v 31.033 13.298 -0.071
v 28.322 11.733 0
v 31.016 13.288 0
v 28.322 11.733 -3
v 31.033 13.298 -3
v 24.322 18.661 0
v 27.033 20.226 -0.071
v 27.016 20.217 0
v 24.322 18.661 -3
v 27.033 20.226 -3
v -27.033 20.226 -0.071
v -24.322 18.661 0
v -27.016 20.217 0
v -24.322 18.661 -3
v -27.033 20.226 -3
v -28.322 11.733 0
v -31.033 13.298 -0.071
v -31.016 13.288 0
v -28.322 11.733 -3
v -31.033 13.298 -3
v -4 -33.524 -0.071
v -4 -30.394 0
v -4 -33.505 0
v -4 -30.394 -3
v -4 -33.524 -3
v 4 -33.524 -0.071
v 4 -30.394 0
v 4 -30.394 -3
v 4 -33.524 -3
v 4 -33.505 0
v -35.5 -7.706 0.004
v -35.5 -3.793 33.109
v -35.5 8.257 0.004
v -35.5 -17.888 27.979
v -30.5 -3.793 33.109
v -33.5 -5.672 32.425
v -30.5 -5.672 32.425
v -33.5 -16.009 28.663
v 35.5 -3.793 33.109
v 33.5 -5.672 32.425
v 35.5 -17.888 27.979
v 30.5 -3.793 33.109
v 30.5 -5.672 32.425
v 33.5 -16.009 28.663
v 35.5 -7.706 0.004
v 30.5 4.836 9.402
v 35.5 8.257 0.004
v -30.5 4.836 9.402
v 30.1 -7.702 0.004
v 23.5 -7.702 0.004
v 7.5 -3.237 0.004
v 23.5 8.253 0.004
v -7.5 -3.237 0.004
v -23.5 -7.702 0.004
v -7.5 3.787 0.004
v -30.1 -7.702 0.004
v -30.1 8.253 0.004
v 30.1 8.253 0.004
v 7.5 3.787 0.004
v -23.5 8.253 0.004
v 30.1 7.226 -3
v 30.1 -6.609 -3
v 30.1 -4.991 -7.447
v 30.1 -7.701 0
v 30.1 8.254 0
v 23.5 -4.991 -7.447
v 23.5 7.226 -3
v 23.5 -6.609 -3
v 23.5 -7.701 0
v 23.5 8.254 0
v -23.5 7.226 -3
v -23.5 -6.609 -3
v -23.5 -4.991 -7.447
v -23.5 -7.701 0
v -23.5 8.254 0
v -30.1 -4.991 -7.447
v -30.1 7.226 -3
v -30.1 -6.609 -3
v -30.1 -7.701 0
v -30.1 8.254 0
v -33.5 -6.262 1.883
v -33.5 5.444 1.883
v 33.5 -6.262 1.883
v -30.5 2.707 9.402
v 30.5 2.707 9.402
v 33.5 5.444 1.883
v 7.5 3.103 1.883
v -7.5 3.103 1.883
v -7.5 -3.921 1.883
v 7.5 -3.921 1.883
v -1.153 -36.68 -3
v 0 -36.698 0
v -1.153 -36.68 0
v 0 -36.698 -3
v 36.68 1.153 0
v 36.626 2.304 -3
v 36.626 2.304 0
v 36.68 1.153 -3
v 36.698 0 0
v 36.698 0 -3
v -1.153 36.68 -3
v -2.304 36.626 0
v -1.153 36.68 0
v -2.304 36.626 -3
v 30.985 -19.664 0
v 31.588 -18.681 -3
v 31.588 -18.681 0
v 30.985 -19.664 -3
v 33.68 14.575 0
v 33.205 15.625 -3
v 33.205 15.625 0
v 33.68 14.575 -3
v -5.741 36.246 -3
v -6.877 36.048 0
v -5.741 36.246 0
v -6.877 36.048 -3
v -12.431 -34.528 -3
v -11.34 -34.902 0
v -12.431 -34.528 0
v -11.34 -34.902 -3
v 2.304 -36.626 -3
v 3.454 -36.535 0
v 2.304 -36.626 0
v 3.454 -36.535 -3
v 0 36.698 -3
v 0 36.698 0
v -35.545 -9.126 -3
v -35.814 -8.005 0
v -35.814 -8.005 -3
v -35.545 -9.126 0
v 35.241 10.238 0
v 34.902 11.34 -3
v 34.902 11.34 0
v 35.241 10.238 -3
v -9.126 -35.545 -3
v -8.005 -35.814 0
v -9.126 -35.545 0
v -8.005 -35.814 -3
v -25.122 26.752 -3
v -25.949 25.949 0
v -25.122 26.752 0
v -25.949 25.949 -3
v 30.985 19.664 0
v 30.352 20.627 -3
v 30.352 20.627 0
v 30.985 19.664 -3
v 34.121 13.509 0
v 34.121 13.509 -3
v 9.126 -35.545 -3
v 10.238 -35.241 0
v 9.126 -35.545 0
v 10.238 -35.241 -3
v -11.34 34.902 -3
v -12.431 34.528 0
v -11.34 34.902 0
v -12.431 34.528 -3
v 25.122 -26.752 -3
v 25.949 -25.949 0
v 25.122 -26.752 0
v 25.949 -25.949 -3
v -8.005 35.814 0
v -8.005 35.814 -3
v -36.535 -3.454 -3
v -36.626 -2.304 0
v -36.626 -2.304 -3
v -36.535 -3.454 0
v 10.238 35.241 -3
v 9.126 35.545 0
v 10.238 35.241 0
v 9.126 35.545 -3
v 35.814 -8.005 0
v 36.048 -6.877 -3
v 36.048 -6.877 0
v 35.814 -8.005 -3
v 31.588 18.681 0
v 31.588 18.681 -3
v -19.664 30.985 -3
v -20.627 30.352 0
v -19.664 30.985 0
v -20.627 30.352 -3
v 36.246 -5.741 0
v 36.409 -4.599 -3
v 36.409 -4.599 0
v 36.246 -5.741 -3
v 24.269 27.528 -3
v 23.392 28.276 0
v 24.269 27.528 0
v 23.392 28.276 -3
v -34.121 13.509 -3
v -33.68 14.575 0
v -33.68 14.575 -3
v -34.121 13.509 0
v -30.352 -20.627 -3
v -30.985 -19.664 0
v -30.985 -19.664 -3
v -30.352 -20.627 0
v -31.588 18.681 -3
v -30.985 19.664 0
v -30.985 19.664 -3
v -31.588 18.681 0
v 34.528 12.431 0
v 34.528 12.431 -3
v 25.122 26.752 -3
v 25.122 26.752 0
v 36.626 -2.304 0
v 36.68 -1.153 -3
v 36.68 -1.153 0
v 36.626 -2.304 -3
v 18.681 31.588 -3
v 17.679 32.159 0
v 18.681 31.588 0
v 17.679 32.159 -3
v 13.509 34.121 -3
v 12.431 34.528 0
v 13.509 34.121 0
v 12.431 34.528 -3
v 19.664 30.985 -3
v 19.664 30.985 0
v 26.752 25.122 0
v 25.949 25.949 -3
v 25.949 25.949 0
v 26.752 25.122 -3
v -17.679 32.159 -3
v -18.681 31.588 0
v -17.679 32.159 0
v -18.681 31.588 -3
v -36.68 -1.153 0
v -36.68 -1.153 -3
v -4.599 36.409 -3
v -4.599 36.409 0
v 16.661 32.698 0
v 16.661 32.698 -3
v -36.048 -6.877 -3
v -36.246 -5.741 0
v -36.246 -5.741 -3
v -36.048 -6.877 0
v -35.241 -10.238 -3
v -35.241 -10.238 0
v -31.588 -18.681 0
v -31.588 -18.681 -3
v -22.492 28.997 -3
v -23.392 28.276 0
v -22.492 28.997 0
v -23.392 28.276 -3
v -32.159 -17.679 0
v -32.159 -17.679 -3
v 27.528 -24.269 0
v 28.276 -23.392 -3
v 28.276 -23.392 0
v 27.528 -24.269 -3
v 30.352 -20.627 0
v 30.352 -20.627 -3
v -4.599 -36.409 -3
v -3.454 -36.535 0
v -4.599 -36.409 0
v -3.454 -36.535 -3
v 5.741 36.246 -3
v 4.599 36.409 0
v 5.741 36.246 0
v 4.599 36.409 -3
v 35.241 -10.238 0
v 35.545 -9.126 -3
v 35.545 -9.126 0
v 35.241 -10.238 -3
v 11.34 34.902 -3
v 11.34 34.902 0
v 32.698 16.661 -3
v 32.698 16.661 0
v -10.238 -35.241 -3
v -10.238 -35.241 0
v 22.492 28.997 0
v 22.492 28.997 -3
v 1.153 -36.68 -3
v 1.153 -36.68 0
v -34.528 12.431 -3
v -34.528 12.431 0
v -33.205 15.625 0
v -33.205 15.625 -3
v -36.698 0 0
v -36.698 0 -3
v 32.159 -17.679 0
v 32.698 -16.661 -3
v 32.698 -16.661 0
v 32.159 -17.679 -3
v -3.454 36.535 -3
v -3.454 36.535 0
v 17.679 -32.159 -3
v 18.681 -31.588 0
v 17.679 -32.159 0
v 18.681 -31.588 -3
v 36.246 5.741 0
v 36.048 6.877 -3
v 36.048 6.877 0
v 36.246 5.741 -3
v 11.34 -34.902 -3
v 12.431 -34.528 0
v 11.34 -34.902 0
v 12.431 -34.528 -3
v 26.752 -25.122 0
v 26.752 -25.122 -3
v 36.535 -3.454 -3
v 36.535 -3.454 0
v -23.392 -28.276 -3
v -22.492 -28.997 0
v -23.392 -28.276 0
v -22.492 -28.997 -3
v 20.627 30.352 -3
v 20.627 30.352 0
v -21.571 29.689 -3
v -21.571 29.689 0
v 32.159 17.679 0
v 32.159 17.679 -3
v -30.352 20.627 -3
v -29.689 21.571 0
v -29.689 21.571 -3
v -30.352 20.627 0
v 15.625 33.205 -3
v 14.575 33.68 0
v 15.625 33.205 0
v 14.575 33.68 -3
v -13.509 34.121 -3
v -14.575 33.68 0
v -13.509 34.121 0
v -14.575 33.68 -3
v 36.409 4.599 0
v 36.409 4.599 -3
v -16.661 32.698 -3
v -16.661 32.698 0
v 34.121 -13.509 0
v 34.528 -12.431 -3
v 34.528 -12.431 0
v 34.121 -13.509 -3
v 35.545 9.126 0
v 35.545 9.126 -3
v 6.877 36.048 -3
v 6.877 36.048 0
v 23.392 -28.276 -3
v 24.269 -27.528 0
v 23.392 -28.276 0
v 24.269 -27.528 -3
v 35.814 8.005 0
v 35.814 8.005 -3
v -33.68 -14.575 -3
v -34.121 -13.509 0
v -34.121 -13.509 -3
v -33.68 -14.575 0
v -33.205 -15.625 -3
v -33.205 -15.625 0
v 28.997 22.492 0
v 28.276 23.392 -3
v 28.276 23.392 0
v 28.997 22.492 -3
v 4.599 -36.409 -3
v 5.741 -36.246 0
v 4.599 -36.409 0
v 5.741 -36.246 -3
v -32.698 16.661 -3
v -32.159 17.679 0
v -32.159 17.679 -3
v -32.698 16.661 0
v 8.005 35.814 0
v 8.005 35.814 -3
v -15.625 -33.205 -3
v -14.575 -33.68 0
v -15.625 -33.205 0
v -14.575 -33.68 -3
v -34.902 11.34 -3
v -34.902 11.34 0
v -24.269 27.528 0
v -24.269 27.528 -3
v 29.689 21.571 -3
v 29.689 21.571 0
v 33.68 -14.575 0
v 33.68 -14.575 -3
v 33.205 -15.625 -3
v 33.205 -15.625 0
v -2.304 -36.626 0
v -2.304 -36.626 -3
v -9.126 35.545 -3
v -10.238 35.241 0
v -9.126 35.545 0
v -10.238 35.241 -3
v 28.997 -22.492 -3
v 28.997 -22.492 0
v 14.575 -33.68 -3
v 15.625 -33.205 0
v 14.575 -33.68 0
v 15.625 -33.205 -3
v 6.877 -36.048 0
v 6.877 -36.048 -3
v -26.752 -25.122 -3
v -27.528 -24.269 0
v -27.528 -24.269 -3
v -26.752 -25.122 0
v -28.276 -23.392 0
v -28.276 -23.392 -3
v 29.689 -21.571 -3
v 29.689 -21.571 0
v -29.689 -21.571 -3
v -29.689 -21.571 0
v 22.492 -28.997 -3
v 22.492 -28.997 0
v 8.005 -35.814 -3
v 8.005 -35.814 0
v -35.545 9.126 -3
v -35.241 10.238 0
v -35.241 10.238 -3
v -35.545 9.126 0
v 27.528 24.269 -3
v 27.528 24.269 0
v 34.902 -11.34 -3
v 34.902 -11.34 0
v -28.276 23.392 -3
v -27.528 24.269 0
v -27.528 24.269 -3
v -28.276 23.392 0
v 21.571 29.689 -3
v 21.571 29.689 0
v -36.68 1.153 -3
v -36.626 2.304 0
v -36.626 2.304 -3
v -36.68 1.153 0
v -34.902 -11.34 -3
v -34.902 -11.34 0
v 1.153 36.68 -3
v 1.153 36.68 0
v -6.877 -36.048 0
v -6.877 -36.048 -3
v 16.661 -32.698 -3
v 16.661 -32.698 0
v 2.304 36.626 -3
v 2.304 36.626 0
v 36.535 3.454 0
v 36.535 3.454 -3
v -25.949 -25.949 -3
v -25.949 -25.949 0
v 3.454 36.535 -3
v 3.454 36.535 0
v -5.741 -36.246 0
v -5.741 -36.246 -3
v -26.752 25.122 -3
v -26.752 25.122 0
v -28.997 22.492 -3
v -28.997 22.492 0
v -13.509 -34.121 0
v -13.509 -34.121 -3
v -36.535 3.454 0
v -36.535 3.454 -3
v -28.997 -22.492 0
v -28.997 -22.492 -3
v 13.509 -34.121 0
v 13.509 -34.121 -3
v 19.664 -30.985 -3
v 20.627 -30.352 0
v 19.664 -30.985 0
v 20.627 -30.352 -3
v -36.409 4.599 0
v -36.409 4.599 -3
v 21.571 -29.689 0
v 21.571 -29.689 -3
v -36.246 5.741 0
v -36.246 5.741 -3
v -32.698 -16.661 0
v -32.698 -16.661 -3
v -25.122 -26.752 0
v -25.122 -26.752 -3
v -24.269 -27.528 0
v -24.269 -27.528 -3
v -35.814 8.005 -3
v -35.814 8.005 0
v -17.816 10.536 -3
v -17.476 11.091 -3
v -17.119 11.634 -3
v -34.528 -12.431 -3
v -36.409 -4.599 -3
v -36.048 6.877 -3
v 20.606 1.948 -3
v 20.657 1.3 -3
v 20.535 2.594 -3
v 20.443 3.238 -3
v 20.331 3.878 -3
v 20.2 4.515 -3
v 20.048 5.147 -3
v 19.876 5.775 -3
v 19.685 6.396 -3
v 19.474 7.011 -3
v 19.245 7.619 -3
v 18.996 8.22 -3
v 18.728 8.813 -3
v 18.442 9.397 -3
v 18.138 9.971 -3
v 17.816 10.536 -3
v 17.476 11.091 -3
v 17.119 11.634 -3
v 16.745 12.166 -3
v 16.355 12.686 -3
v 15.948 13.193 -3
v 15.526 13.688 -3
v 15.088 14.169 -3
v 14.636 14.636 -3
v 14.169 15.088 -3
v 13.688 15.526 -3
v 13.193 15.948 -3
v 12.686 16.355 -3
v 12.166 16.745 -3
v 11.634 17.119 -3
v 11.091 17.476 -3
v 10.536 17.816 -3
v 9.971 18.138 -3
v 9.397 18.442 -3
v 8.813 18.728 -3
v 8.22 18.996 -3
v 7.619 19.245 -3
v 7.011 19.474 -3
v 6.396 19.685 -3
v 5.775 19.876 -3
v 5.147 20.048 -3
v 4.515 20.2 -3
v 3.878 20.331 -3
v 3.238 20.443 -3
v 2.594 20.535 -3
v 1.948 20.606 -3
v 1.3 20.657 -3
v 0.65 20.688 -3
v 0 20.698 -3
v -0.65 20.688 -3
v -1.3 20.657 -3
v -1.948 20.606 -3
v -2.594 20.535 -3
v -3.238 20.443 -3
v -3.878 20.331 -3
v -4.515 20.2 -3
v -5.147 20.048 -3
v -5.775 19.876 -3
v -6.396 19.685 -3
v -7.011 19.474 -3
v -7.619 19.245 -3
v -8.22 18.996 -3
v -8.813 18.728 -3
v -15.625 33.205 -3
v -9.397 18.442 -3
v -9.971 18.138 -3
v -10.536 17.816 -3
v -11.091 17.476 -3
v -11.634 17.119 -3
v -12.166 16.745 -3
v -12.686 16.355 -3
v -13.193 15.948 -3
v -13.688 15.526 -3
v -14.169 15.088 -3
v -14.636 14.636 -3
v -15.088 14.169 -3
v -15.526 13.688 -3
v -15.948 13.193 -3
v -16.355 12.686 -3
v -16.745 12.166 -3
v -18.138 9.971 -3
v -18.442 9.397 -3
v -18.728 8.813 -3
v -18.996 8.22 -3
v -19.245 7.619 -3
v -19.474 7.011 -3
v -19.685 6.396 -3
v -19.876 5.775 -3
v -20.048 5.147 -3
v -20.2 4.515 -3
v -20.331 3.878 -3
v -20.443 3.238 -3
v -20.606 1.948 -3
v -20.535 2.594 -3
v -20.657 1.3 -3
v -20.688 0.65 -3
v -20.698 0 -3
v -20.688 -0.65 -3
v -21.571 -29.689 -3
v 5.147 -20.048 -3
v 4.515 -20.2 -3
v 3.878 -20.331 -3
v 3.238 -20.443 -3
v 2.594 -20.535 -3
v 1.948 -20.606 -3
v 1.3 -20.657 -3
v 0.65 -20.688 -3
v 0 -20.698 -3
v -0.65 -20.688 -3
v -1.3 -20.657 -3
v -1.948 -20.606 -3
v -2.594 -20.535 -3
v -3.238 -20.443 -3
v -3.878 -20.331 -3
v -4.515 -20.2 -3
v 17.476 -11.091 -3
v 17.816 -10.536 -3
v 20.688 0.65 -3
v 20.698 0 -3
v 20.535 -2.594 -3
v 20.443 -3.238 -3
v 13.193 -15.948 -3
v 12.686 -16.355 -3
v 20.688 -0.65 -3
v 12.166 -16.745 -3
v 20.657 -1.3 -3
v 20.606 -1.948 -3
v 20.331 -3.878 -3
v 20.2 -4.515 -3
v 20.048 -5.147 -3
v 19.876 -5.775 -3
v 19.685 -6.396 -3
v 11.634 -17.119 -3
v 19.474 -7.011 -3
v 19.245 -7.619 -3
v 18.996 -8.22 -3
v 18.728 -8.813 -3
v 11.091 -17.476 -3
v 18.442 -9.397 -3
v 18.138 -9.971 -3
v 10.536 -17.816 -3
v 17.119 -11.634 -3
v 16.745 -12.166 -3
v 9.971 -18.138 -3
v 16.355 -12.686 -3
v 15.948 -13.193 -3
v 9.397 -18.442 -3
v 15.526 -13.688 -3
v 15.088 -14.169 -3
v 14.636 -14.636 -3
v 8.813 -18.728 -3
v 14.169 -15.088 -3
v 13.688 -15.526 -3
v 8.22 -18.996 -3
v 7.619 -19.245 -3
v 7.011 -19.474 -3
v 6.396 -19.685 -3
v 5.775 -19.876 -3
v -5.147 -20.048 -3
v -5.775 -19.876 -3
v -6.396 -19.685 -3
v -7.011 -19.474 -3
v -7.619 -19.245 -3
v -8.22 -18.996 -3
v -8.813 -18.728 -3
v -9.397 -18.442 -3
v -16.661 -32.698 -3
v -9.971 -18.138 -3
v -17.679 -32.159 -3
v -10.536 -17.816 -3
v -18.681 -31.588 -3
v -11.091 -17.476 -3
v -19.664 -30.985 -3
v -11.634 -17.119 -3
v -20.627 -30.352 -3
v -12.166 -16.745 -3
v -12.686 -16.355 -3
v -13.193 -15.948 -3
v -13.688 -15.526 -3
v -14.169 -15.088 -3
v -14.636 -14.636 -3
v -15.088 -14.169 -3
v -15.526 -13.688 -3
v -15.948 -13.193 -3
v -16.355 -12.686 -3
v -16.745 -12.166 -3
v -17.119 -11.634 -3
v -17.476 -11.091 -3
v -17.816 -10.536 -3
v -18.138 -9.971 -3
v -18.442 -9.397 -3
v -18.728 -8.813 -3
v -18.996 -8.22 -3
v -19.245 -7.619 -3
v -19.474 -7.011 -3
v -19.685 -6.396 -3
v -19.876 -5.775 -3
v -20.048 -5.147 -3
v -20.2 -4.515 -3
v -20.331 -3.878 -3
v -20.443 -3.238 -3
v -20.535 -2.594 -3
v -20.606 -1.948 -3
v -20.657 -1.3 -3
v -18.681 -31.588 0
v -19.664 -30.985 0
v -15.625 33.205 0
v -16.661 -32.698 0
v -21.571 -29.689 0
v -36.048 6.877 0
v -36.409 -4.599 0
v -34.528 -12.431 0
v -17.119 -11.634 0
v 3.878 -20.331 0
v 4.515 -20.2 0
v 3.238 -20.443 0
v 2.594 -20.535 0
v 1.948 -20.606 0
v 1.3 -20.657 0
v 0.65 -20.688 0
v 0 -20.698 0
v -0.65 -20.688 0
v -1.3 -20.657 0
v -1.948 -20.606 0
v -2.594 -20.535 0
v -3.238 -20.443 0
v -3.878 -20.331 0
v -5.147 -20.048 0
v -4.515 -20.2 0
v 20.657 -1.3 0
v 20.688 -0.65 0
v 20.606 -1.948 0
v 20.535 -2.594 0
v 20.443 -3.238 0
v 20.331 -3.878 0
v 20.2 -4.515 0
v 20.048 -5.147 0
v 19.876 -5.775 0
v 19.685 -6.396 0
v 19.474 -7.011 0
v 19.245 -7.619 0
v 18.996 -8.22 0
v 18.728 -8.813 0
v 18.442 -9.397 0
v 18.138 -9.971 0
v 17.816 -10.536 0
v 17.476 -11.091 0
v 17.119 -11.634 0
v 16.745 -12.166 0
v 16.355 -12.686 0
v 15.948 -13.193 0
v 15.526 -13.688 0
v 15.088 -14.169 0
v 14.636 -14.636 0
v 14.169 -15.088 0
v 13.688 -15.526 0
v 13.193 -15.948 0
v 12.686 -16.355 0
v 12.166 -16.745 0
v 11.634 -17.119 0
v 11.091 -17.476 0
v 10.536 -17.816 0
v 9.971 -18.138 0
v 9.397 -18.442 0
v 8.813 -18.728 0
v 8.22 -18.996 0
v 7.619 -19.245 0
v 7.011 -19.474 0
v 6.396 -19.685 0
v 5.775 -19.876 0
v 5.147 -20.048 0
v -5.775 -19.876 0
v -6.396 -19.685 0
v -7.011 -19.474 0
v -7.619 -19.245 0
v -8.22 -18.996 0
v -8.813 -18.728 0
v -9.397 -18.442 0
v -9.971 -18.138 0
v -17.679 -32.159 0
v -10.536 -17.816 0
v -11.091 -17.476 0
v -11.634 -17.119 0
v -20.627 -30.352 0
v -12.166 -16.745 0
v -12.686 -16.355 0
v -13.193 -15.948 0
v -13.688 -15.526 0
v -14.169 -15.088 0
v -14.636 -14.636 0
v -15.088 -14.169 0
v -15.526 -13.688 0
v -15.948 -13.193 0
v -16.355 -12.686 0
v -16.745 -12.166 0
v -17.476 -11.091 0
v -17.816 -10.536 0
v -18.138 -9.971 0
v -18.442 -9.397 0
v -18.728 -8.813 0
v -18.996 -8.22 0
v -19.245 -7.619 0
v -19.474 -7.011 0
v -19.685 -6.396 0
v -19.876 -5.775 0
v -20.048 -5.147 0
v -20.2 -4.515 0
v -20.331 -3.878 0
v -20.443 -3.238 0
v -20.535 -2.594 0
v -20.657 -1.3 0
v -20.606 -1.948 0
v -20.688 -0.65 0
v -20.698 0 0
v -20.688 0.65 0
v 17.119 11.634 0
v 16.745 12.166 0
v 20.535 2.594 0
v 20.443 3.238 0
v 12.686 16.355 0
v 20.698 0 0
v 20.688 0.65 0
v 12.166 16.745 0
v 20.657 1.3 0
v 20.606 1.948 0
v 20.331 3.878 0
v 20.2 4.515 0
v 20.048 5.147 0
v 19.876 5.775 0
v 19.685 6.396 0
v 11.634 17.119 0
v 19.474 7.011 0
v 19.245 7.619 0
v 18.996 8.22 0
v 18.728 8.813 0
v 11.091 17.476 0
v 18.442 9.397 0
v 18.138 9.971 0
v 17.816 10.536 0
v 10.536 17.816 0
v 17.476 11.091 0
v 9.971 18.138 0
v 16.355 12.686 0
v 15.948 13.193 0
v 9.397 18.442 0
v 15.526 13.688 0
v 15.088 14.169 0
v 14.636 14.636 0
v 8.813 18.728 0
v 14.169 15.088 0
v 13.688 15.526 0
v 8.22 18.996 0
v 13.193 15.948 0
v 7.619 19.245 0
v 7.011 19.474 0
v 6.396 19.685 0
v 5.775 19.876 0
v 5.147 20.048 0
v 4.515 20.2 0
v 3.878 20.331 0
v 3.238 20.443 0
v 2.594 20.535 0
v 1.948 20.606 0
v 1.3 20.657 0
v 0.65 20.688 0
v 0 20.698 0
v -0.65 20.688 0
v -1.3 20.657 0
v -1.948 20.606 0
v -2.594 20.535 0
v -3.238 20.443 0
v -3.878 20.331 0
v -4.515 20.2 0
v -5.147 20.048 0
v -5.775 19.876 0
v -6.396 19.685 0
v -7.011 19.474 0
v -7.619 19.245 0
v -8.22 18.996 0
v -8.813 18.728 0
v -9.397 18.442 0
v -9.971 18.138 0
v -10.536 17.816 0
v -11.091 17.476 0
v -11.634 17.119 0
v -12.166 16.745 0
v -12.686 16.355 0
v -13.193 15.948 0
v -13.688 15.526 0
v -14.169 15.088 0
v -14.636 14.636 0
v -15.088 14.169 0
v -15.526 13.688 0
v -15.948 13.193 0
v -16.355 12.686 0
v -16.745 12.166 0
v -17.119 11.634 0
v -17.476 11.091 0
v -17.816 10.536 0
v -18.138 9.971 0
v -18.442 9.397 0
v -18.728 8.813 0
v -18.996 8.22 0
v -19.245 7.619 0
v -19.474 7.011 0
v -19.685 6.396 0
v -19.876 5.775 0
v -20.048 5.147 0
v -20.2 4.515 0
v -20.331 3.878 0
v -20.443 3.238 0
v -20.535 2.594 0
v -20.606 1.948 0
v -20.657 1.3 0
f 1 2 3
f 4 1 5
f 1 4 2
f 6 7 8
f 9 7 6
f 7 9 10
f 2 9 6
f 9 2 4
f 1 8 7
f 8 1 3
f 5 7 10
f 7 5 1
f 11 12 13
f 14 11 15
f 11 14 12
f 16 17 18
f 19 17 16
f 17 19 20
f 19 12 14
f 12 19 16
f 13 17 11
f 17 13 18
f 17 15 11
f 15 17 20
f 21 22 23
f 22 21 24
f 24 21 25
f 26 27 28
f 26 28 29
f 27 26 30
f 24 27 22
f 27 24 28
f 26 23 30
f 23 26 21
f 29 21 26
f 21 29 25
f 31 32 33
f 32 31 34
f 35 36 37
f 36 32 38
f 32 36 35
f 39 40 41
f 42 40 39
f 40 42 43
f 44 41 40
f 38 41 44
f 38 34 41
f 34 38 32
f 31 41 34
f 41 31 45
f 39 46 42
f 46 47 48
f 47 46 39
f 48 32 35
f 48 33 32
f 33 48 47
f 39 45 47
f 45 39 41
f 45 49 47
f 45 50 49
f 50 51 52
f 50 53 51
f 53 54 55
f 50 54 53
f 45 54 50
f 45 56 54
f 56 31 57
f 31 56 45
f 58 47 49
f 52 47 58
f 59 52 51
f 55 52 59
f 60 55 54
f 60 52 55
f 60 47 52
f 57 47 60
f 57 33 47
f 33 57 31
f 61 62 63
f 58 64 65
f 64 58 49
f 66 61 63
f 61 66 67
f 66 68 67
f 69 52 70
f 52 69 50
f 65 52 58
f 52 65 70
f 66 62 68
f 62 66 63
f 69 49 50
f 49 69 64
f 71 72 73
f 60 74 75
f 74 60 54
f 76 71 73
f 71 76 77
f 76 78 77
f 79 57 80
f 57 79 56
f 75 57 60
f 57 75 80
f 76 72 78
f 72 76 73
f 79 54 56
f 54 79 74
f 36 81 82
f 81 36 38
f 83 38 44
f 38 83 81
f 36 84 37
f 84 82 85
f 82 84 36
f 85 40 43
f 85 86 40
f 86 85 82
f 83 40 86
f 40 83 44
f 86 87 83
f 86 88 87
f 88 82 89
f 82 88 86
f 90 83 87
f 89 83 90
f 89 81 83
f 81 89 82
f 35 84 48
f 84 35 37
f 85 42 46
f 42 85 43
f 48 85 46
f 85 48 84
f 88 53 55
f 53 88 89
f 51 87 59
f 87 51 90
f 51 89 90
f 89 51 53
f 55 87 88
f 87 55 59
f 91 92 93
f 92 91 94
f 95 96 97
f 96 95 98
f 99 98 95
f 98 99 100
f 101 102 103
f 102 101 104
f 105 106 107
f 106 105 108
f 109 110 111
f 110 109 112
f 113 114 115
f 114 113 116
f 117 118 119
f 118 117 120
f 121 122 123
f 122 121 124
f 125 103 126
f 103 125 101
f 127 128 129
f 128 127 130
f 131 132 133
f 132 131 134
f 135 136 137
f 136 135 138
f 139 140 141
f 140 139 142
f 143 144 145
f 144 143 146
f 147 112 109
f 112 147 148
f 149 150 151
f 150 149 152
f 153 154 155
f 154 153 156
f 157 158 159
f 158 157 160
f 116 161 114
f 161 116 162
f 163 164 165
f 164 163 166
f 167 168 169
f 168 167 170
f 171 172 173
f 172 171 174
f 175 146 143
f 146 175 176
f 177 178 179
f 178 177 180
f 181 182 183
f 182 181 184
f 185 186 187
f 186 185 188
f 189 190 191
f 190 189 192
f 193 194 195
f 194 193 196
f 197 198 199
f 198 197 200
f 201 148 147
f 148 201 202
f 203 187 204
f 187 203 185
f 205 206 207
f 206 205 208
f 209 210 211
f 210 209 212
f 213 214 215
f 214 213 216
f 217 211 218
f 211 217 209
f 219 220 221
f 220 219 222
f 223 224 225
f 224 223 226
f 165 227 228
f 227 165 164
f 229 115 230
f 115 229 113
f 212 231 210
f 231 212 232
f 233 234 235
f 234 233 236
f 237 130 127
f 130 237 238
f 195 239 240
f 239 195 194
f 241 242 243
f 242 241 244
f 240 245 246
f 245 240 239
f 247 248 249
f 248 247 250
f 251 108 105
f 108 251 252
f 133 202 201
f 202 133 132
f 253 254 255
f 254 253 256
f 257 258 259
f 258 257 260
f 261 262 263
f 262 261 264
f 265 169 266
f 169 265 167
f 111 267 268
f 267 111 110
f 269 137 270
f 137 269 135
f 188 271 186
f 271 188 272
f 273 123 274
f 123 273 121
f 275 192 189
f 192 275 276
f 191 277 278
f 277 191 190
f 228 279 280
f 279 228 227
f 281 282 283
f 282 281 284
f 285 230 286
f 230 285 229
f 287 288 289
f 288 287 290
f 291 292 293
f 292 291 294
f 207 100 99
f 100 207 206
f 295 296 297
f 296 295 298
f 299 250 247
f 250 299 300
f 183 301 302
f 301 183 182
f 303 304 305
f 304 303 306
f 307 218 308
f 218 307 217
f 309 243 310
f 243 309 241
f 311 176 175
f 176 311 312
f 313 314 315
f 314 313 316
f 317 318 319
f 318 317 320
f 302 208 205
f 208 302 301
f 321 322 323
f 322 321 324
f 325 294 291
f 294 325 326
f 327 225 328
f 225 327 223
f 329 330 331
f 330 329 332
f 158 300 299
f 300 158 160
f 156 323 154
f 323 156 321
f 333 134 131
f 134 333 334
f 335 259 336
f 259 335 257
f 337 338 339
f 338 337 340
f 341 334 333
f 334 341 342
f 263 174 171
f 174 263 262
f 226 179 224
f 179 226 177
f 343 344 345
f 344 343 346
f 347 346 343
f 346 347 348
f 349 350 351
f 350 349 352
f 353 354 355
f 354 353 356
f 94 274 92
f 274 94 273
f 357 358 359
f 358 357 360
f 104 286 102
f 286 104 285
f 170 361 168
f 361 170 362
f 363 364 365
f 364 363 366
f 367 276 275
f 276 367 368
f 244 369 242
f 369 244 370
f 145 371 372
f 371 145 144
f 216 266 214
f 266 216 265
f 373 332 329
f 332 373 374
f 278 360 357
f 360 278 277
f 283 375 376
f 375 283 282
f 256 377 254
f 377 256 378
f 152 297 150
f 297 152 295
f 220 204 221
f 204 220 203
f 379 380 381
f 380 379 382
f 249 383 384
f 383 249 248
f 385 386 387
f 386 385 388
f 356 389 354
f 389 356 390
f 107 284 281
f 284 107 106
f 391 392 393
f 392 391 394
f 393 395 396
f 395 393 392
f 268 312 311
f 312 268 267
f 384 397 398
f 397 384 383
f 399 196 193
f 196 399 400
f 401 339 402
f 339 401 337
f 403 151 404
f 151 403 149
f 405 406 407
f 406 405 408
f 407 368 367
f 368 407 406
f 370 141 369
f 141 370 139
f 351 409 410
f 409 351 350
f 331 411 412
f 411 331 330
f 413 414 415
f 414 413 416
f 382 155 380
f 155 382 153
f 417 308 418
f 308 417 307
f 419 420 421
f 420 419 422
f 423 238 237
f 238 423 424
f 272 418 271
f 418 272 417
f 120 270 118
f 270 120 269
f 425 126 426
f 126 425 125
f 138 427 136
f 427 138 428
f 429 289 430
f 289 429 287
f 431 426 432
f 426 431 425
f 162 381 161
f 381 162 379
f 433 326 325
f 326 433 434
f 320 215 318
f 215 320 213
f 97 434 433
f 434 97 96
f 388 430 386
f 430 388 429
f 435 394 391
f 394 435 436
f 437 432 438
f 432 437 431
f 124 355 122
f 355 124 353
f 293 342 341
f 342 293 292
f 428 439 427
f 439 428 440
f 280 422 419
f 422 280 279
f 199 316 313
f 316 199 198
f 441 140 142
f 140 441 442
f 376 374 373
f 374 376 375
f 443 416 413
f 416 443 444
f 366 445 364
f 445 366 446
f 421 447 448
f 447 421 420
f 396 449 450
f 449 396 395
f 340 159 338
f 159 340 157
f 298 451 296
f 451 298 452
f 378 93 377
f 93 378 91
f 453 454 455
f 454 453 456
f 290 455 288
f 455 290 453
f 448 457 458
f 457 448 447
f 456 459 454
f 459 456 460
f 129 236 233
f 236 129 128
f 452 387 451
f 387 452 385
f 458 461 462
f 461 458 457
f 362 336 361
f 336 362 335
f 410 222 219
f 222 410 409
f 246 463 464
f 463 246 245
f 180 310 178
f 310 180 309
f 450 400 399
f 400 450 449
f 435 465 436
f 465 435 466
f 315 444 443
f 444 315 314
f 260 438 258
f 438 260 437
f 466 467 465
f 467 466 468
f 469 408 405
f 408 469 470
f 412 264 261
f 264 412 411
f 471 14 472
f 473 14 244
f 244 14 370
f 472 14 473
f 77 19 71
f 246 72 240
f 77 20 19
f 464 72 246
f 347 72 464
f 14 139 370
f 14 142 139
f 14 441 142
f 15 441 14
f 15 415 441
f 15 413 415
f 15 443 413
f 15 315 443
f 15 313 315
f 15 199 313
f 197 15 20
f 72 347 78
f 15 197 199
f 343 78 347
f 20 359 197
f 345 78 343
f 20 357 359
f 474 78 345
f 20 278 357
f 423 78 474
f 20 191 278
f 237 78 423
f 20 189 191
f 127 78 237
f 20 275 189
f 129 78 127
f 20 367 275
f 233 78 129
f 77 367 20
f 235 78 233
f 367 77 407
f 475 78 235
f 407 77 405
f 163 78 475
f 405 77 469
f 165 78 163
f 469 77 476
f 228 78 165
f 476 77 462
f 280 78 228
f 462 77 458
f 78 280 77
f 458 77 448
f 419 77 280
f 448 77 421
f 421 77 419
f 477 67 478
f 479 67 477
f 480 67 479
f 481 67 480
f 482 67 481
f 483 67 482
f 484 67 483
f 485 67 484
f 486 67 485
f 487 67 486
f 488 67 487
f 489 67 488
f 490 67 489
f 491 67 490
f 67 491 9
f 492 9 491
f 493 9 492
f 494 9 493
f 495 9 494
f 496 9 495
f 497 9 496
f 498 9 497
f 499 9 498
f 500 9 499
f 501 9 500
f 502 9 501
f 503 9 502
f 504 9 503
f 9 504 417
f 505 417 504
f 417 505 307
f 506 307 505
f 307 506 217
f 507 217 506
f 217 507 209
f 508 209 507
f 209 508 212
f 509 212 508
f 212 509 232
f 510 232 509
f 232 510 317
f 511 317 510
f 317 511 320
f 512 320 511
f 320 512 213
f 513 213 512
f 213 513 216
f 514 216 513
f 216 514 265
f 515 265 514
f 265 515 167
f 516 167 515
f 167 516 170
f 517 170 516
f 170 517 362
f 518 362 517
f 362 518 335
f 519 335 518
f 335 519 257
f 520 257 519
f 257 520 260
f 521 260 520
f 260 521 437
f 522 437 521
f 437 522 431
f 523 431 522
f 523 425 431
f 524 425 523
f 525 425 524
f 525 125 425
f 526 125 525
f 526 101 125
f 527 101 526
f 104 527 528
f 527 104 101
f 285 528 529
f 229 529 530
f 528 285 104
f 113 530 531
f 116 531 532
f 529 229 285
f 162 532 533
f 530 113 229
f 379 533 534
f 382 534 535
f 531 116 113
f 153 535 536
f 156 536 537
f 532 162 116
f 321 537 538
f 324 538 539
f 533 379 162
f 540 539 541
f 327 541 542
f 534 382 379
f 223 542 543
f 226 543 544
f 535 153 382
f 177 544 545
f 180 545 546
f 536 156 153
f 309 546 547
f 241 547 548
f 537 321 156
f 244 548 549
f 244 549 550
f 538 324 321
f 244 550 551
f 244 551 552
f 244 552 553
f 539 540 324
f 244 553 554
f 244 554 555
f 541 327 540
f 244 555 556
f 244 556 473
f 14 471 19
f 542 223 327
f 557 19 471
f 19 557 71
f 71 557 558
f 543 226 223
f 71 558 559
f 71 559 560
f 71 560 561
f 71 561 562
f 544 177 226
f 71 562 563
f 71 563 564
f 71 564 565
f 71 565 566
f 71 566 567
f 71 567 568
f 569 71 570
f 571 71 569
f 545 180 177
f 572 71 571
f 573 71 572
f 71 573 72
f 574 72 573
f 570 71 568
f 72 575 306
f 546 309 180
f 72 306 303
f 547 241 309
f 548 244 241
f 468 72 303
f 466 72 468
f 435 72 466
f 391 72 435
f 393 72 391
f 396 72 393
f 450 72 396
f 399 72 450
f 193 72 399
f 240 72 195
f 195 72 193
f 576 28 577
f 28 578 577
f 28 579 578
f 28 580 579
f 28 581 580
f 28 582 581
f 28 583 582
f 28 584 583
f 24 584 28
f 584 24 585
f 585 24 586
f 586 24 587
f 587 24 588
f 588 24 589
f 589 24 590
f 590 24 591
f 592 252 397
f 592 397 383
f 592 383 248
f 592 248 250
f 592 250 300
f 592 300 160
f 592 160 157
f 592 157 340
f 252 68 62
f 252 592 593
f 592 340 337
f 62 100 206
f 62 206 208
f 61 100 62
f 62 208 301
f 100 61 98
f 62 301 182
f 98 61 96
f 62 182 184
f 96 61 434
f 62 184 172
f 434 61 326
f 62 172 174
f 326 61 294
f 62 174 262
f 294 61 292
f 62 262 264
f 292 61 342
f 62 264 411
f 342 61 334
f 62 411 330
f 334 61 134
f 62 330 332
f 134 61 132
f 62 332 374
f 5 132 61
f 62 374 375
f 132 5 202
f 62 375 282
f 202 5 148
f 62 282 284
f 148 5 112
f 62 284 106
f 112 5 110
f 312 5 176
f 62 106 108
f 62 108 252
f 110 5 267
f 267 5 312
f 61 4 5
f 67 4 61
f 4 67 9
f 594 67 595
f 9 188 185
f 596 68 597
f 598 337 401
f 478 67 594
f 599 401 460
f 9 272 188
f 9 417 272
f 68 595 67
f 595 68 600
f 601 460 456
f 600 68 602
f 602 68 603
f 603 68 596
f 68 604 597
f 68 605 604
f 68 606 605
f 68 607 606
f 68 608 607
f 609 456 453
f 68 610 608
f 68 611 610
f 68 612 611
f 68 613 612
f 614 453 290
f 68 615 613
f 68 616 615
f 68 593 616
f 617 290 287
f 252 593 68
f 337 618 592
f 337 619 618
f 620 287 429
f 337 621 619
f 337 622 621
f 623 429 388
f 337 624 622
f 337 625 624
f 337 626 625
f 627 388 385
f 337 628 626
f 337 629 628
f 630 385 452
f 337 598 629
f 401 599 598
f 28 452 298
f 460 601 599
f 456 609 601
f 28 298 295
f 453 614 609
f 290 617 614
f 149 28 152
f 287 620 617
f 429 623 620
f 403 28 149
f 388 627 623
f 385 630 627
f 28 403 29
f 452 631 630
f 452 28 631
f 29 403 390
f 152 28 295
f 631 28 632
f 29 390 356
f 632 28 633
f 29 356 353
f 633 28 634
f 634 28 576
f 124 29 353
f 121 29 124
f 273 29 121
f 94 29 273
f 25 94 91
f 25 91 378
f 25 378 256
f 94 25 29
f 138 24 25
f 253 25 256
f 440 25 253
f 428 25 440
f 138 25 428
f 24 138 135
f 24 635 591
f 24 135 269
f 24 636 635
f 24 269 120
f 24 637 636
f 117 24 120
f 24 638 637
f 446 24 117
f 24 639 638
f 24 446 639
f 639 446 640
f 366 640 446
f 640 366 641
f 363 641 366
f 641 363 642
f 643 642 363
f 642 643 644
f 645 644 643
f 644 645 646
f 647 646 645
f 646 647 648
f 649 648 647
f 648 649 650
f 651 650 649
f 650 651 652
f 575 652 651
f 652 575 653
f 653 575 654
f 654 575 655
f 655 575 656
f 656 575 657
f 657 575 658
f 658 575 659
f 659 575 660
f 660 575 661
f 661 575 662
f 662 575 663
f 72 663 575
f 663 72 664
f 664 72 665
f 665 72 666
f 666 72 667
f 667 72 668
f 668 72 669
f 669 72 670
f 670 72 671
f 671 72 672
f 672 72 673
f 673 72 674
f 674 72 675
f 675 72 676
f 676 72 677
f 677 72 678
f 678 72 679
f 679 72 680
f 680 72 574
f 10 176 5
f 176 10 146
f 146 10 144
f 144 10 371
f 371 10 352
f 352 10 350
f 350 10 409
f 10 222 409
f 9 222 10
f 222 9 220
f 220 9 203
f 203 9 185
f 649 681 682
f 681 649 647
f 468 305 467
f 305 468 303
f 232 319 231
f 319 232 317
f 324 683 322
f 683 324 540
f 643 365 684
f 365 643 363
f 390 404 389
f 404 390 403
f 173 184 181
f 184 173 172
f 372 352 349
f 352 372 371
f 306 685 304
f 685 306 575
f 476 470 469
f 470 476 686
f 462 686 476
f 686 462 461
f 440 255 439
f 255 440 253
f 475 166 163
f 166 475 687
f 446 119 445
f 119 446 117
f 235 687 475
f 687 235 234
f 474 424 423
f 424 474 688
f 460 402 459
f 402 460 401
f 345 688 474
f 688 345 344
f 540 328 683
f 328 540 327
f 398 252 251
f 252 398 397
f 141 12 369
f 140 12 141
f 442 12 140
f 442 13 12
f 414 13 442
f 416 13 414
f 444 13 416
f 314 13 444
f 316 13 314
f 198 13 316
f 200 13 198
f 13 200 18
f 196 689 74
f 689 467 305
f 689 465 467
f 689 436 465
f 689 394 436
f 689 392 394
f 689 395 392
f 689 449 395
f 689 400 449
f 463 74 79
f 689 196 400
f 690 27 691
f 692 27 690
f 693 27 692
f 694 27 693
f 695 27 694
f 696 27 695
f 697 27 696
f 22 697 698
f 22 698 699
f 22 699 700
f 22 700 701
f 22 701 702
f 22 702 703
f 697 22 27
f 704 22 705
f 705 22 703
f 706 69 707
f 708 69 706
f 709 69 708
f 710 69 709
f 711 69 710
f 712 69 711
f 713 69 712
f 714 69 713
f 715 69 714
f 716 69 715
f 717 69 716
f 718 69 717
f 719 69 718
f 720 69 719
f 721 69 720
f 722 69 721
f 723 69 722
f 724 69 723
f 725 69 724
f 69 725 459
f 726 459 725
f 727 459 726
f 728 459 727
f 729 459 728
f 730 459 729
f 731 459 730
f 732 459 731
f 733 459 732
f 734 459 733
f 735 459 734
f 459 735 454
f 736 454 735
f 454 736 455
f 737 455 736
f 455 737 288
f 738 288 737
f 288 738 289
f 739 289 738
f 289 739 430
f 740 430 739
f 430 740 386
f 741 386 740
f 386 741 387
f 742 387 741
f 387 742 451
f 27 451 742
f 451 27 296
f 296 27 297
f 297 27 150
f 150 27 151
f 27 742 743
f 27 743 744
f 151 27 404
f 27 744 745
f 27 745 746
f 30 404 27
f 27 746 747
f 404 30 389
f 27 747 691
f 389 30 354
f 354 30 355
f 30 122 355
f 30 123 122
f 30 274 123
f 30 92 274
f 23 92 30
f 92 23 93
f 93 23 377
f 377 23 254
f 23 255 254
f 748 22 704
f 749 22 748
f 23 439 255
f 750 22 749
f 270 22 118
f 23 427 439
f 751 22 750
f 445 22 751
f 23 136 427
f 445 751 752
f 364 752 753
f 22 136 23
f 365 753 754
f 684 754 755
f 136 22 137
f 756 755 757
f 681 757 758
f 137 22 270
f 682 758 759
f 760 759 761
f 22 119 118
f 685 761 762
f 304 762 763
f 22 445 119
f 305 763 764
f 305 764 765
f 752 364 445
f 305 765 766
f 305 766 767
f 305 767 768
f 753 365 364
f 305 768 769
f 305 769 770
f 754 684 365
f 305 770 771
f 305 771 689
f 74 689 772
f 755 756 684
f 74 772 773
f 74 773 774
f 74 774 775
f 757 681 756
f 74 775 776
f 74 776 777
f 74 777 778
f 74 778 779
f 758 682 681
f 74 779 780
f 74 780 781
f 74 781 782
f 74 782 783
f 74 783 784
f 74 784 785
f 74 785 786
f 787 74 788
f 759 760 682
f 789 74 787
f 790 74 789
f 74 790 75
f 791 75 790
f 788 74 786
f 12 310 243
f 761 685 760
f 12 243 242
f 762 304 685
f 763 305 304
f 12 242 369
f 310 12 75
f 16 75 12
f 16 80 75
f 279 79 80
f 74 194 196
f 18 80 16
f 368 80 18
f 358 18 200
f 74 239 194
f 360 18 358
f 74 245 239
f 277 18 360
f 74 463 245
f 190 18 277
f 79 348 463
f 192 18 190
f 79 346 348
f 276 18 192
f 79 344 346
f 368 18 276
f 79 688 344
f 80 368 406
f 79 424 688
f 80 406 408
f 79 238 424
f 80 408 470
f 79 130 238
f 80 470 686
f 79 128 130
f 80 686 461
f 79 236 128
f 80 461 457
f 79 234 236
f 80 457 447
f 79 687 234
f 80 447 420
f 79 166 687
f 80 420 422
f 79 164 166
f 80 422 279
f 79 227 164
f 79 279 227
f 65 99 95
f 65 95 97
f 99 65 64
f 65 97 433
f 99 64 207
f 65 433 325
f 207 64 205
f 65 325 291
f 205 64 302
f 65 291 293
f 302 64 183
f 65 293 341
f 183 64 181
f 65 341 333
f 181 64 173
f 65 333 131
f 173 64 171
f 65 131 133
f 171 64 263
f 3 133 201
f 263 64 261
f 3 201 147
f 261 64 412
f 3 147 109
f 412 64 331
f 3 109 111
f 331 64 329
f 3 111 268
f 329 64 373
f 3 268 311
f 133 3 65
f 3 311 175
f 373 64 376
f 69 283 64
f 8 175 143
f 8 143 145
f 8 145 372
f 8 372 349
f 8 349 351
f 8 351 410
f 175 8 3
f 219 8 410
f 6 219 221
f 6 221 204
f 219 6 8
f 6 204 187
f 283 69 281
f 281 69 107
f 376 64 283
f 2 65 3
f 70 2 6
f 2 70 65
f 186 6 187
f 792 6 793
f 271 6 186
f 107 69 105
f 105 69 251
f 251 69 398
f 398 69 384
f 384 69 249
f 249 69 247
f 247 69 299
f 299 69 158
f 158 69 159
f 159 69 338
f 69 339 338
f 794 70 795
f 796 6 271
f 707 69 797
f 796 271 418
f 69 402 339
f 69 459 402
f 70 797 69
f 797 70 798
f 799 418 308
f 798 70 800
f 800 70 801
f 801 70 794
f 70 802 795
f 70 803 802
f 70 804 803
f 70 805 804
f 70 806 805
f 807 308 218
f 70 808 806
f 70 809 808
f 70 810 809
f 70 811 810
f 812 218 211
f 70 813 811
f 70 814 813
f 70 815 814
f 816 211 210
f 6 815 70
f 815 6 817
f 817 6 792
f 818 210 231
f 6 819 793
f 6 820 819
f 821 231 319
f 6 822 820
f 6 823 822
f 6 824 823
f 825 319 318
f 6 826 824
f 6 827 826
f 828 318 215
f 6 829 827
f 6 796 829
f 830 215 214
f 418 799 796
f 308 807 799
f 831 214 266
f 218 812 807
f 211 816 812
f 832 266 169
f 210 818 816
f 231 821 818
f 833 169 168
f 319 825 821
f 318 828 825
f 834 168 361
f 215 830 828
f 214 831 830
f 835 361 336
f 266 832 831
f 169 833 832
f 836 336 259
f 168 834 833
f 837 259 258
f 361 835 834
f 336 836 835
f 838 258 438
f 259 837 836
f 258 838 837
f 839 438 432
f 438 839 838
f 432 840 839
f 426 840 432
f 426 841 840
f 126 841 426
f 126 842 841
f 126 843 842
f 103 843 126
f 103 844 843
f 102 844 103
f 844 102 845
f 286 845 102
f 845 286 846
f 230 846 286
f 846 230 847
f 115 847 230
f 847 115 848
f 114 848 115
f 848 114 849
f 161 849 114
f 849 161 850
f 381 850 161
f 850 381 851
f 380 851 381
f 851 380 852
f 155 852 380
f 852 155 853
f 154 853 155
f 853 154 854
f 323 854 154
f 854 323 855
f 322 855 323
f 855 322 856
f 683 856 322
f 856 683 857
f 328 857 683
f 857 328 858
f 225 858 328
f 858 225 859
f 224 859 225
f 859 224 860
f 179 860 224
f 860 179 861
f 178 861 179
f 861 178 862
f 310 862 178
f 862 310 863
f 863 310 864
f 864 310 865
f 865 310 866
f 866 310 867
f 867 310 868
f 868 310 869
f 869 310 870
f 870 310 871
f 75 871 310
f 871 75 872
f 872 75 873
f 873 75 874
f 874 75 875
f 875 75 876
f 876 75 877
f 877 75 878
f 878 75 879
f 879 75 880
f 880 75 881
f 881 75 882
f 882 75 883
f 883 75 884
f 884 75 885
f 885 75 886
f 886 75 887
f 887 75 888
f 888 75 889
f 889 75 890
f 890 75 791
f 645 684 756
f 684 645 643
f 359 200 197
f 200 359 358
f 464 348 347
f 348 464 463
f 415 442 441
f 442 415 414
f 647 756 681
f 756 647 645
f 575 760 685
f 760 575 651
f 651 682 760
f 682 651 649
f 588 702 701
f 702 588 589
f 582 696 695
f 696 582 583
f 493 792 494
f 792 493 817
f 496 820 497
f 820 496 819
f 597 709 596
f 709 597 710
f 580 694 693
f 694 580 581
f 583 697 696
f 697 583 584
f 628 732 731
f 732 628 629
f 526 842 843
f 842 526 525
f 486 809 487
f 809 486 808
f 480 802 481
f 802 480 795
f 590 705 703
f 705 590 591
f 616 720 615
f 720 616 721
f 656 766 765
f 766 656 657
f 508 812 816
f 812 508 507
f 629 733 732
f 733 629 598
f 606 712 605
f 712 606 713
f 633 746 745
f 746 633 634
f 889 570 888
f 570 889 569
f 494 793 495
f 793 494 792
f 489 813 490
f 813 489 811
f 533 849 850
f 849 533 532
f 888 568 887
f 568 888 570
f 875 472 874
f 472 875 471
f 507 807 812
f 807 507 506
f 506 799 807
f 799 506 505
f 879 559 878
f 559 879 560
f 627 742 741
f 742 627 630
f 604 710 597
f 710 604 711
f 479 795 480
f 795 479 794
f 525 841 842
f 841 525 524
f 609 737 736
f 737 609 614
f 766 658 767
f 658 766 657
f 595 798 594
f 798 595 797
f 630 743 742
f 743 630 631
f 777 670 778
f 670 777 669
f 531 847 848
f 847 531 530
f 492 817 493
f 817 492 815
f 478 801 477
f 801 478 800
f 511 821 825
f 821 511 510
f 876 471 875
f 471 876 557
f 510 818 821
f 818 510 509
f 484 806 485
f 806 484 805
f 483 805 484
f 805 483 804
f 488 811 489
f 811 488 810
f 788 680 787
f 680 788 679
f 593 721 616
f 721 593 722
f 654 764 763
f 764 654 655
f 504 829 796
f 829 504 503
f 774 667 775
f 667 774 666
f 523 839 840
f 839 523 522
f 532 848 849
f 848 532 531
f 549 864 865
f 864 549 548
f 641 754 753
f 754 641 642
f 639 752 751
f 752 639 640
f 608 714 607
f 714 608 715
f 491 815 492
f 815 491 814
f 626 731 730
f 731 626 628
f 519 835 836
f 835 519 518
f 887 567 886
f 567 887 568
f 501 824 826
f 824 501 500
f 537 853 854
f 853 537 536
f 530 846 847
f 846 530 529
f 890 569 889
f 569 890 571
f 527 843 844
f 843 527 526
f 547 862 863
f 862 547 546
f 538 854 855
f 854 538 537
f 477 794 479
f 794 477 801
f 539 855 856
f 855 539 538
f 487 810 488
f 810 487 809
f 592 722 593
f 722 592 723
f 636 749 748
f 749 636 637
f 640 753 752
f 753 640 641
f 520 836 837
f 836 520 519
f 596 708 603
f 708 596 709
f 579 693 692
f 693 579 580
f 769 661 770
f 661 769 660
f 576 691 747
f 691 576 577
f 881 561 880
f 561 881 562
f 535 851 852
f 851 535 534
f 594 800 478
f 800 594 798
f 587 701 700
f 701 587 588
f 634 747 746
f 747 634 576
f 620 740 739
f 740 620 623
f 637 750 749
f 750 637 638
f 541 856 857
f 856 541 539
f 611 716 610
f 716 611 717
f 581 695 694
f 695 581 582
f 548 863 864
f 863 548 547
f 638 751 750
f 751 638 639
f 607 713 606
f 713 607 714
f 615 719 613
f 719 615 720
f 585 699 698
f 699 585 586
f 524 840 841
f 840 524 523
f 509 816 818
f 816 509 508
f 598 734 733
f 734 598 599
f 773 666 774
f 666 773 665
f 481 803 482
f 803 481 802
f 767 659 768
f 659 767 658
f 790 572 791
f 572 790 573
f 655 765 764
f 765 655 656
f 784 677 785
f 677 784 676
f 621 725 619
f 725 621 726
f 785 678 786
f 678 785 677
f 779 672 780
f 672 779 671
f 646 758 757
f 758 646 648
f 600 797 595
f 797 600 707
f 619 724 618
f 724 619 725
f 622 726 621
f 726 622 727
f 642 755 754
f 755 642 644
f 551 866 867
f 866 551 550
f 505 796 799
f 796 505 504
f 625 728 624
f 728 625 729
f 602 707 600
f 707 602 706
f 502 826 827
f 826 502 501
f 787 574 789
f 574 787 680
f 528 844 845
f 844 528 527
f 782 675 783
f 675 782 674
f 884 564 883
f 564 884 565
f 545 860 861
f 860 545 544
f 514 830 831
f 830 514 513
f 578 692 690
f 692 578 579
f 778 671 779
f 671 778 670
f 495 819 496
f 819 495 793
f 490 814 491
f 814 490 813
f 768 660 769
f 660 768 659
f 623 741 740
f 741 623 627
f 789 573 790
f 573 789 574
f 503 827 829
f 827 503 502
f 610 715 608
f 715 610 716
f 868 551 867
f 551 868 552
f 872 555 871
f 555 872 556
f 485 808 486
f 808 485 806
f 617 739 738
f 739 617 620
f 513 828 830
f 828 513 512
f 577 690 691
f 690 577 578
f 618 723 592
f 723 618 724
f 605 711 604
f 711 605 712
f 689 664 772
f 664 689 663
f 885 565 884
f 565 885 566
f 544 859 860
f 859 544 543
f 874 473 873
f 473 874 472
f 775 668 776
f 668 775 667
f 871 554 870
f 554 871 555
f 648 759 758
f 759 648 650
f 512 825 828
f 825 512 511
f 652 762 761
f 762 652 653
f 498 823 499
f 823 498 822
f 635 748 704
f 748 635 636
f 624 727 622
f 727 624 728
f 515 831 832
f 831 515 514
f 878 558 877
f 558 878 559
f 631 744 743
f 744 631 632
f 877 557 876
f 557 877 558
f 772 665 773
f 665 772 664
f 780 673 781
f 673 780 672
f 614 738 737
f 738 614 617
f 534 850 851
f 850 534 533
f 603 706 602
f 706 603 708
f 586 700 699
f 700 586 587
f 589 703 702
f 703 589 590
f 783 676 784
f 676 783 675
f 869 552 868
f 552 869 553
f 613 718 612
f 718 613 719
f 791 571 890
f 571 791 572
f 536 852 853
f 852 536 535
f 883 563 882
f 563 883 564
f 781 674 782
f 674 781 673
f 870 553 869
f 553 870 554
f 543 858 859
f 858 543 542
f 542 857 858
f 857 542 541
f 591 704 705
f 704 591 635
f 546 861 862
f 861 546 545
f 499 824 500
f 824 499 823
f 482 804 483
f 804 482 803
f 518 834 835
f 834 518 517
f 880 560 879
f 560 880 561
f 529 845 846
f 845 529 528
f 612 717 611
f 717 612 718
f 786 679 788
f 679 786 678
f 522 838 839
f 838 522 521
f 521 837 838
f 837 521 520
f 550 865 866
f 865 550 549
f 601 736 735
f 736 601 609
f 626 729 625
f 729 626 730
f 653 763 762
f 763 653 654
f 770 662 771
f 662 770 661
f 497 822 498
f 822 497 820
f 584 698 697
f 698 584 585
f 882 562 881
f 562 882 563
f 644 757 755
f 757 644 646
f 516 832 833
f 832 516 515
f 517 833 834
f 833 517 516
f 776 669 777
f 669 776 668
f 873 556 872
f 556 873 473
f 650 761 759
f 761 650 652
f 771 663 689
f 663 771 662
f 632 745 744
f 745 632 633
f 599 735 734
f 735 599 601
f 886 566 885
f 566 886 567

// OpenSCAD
cup_hole=66;
edge_thickness=6;
cone_angle=15;
tab_angle=10;

phone_w=67;
phone_t=11;
phone_angle=20;


delta=0.5*edge_thickness/cos(cone_angle);
inner_r = 0.5*cup_hole - delta;
outer_r=inner_r + 0.5*edge_thickness*tan(cone_angle);


disc();
phone_bracket();
//tab();
//tabs();
//demi_phone_bracket();

//phone_block(x=phone_w, y= phone_t, z=30, angle=phone_angle);

module phone_block(x=1, y= 1, z=1, angle=20)
{
	rotate([-angle,0,0])
	difference()
	{
		rotate([angle,0,0])
	  		cube([x, y, z], center=true);
		translate([0,0,-0.5*(z+cos(angle)*(z-y))])
			cube([10*x, 10*y, z], center=true);
	}
}

module demi_phone_bracket()
{
	rotate([90-phone_angle,0,0])
	intersection()
	{
		phone_bracket();
		translate([-50,0,0])
		rotate([phone_angle,0,0])
			translate([0,0,-10])
			  cube([100,100,100]);
	}
}

module phone_bracket()
{
translate([0,-4,11.75])
rotate([phone_angle,0,0])
difference()
{
	union()
	{
	phone_block(x=phone_w+4, y=phone_t+4, z=40, angle=phone_angle);
		translate([phone_w*0.4,0,-13.7])
			rotate([0,0,0])
				cube([phone_t*0.6, phone_t*1.363, 8], center=true);
		translate([-phone_w*0.4,0,-13.7])
			rotate([0,0,0])
				cube([phone_t*0.6, phone_t*1.363, 8], center=true);
	}
	translate([0,0,4])
			phone_block(x=phone_w, y=phone_t, z=40, angle=phone_angle);
	translate([0,phone_t*0.5,10])
			phone_block(x=phone_w-6, y=phone_t, z=40, angle=phone_angle);
	translate([0,0,0])
			phone_block(x=15, y=phone_t*0.6, z=60, angle=phone_angle);	
}


}

module disc()
{
difference()
{
translate([0,0,-1.5])
cylinder(r=outer_r+6,  h=3, center=true,$fn=200);
translate([0,0,-1.5])
cylinder(r=outer_r-10,  h=30, center=true,$fn=200);
tabs();
phone_bracket();
}

}

module tab()
{

translate([(cup_hole+edge_thickness*(1-1/cos(cone_angle)))*0.5 , 0, 0])
translate([0,0,edge_thickness*0.38])
rotate([0,0,-90])
difference()
{
translate([0,0,-edge_thickness*0.1])
cube([8,5,edge_thickness*1.6], center=true);


translate([-7.5,0,0])
rotate([-cone_angle,0,0])
cube([15,5,1.5*edge_thickness]);

translate([-7.5,0,0])
rotate([cone_angle,0,0])
translate([0,0,-1.5*edge_thickness])
cube([15,5,1.5*edge_thickness]);

translate([-7.5,0,0.75*edge_thickness])
rotate([cone_angle,0,0])
translate([0,0,-1.5*edge_thickness])
cube([15,5,1.5*edge_thickness]);

translate([-7.5,0.63,-1.5*edge_thickness])
cube([15,5,1.5*edge_thickness]);


}
}

module tabs()
{
union()
{
rotate([0,0,30])
tab();
rotate([0,0,150])
tab();
rotate([0,0,-90])
tab();
}
}
